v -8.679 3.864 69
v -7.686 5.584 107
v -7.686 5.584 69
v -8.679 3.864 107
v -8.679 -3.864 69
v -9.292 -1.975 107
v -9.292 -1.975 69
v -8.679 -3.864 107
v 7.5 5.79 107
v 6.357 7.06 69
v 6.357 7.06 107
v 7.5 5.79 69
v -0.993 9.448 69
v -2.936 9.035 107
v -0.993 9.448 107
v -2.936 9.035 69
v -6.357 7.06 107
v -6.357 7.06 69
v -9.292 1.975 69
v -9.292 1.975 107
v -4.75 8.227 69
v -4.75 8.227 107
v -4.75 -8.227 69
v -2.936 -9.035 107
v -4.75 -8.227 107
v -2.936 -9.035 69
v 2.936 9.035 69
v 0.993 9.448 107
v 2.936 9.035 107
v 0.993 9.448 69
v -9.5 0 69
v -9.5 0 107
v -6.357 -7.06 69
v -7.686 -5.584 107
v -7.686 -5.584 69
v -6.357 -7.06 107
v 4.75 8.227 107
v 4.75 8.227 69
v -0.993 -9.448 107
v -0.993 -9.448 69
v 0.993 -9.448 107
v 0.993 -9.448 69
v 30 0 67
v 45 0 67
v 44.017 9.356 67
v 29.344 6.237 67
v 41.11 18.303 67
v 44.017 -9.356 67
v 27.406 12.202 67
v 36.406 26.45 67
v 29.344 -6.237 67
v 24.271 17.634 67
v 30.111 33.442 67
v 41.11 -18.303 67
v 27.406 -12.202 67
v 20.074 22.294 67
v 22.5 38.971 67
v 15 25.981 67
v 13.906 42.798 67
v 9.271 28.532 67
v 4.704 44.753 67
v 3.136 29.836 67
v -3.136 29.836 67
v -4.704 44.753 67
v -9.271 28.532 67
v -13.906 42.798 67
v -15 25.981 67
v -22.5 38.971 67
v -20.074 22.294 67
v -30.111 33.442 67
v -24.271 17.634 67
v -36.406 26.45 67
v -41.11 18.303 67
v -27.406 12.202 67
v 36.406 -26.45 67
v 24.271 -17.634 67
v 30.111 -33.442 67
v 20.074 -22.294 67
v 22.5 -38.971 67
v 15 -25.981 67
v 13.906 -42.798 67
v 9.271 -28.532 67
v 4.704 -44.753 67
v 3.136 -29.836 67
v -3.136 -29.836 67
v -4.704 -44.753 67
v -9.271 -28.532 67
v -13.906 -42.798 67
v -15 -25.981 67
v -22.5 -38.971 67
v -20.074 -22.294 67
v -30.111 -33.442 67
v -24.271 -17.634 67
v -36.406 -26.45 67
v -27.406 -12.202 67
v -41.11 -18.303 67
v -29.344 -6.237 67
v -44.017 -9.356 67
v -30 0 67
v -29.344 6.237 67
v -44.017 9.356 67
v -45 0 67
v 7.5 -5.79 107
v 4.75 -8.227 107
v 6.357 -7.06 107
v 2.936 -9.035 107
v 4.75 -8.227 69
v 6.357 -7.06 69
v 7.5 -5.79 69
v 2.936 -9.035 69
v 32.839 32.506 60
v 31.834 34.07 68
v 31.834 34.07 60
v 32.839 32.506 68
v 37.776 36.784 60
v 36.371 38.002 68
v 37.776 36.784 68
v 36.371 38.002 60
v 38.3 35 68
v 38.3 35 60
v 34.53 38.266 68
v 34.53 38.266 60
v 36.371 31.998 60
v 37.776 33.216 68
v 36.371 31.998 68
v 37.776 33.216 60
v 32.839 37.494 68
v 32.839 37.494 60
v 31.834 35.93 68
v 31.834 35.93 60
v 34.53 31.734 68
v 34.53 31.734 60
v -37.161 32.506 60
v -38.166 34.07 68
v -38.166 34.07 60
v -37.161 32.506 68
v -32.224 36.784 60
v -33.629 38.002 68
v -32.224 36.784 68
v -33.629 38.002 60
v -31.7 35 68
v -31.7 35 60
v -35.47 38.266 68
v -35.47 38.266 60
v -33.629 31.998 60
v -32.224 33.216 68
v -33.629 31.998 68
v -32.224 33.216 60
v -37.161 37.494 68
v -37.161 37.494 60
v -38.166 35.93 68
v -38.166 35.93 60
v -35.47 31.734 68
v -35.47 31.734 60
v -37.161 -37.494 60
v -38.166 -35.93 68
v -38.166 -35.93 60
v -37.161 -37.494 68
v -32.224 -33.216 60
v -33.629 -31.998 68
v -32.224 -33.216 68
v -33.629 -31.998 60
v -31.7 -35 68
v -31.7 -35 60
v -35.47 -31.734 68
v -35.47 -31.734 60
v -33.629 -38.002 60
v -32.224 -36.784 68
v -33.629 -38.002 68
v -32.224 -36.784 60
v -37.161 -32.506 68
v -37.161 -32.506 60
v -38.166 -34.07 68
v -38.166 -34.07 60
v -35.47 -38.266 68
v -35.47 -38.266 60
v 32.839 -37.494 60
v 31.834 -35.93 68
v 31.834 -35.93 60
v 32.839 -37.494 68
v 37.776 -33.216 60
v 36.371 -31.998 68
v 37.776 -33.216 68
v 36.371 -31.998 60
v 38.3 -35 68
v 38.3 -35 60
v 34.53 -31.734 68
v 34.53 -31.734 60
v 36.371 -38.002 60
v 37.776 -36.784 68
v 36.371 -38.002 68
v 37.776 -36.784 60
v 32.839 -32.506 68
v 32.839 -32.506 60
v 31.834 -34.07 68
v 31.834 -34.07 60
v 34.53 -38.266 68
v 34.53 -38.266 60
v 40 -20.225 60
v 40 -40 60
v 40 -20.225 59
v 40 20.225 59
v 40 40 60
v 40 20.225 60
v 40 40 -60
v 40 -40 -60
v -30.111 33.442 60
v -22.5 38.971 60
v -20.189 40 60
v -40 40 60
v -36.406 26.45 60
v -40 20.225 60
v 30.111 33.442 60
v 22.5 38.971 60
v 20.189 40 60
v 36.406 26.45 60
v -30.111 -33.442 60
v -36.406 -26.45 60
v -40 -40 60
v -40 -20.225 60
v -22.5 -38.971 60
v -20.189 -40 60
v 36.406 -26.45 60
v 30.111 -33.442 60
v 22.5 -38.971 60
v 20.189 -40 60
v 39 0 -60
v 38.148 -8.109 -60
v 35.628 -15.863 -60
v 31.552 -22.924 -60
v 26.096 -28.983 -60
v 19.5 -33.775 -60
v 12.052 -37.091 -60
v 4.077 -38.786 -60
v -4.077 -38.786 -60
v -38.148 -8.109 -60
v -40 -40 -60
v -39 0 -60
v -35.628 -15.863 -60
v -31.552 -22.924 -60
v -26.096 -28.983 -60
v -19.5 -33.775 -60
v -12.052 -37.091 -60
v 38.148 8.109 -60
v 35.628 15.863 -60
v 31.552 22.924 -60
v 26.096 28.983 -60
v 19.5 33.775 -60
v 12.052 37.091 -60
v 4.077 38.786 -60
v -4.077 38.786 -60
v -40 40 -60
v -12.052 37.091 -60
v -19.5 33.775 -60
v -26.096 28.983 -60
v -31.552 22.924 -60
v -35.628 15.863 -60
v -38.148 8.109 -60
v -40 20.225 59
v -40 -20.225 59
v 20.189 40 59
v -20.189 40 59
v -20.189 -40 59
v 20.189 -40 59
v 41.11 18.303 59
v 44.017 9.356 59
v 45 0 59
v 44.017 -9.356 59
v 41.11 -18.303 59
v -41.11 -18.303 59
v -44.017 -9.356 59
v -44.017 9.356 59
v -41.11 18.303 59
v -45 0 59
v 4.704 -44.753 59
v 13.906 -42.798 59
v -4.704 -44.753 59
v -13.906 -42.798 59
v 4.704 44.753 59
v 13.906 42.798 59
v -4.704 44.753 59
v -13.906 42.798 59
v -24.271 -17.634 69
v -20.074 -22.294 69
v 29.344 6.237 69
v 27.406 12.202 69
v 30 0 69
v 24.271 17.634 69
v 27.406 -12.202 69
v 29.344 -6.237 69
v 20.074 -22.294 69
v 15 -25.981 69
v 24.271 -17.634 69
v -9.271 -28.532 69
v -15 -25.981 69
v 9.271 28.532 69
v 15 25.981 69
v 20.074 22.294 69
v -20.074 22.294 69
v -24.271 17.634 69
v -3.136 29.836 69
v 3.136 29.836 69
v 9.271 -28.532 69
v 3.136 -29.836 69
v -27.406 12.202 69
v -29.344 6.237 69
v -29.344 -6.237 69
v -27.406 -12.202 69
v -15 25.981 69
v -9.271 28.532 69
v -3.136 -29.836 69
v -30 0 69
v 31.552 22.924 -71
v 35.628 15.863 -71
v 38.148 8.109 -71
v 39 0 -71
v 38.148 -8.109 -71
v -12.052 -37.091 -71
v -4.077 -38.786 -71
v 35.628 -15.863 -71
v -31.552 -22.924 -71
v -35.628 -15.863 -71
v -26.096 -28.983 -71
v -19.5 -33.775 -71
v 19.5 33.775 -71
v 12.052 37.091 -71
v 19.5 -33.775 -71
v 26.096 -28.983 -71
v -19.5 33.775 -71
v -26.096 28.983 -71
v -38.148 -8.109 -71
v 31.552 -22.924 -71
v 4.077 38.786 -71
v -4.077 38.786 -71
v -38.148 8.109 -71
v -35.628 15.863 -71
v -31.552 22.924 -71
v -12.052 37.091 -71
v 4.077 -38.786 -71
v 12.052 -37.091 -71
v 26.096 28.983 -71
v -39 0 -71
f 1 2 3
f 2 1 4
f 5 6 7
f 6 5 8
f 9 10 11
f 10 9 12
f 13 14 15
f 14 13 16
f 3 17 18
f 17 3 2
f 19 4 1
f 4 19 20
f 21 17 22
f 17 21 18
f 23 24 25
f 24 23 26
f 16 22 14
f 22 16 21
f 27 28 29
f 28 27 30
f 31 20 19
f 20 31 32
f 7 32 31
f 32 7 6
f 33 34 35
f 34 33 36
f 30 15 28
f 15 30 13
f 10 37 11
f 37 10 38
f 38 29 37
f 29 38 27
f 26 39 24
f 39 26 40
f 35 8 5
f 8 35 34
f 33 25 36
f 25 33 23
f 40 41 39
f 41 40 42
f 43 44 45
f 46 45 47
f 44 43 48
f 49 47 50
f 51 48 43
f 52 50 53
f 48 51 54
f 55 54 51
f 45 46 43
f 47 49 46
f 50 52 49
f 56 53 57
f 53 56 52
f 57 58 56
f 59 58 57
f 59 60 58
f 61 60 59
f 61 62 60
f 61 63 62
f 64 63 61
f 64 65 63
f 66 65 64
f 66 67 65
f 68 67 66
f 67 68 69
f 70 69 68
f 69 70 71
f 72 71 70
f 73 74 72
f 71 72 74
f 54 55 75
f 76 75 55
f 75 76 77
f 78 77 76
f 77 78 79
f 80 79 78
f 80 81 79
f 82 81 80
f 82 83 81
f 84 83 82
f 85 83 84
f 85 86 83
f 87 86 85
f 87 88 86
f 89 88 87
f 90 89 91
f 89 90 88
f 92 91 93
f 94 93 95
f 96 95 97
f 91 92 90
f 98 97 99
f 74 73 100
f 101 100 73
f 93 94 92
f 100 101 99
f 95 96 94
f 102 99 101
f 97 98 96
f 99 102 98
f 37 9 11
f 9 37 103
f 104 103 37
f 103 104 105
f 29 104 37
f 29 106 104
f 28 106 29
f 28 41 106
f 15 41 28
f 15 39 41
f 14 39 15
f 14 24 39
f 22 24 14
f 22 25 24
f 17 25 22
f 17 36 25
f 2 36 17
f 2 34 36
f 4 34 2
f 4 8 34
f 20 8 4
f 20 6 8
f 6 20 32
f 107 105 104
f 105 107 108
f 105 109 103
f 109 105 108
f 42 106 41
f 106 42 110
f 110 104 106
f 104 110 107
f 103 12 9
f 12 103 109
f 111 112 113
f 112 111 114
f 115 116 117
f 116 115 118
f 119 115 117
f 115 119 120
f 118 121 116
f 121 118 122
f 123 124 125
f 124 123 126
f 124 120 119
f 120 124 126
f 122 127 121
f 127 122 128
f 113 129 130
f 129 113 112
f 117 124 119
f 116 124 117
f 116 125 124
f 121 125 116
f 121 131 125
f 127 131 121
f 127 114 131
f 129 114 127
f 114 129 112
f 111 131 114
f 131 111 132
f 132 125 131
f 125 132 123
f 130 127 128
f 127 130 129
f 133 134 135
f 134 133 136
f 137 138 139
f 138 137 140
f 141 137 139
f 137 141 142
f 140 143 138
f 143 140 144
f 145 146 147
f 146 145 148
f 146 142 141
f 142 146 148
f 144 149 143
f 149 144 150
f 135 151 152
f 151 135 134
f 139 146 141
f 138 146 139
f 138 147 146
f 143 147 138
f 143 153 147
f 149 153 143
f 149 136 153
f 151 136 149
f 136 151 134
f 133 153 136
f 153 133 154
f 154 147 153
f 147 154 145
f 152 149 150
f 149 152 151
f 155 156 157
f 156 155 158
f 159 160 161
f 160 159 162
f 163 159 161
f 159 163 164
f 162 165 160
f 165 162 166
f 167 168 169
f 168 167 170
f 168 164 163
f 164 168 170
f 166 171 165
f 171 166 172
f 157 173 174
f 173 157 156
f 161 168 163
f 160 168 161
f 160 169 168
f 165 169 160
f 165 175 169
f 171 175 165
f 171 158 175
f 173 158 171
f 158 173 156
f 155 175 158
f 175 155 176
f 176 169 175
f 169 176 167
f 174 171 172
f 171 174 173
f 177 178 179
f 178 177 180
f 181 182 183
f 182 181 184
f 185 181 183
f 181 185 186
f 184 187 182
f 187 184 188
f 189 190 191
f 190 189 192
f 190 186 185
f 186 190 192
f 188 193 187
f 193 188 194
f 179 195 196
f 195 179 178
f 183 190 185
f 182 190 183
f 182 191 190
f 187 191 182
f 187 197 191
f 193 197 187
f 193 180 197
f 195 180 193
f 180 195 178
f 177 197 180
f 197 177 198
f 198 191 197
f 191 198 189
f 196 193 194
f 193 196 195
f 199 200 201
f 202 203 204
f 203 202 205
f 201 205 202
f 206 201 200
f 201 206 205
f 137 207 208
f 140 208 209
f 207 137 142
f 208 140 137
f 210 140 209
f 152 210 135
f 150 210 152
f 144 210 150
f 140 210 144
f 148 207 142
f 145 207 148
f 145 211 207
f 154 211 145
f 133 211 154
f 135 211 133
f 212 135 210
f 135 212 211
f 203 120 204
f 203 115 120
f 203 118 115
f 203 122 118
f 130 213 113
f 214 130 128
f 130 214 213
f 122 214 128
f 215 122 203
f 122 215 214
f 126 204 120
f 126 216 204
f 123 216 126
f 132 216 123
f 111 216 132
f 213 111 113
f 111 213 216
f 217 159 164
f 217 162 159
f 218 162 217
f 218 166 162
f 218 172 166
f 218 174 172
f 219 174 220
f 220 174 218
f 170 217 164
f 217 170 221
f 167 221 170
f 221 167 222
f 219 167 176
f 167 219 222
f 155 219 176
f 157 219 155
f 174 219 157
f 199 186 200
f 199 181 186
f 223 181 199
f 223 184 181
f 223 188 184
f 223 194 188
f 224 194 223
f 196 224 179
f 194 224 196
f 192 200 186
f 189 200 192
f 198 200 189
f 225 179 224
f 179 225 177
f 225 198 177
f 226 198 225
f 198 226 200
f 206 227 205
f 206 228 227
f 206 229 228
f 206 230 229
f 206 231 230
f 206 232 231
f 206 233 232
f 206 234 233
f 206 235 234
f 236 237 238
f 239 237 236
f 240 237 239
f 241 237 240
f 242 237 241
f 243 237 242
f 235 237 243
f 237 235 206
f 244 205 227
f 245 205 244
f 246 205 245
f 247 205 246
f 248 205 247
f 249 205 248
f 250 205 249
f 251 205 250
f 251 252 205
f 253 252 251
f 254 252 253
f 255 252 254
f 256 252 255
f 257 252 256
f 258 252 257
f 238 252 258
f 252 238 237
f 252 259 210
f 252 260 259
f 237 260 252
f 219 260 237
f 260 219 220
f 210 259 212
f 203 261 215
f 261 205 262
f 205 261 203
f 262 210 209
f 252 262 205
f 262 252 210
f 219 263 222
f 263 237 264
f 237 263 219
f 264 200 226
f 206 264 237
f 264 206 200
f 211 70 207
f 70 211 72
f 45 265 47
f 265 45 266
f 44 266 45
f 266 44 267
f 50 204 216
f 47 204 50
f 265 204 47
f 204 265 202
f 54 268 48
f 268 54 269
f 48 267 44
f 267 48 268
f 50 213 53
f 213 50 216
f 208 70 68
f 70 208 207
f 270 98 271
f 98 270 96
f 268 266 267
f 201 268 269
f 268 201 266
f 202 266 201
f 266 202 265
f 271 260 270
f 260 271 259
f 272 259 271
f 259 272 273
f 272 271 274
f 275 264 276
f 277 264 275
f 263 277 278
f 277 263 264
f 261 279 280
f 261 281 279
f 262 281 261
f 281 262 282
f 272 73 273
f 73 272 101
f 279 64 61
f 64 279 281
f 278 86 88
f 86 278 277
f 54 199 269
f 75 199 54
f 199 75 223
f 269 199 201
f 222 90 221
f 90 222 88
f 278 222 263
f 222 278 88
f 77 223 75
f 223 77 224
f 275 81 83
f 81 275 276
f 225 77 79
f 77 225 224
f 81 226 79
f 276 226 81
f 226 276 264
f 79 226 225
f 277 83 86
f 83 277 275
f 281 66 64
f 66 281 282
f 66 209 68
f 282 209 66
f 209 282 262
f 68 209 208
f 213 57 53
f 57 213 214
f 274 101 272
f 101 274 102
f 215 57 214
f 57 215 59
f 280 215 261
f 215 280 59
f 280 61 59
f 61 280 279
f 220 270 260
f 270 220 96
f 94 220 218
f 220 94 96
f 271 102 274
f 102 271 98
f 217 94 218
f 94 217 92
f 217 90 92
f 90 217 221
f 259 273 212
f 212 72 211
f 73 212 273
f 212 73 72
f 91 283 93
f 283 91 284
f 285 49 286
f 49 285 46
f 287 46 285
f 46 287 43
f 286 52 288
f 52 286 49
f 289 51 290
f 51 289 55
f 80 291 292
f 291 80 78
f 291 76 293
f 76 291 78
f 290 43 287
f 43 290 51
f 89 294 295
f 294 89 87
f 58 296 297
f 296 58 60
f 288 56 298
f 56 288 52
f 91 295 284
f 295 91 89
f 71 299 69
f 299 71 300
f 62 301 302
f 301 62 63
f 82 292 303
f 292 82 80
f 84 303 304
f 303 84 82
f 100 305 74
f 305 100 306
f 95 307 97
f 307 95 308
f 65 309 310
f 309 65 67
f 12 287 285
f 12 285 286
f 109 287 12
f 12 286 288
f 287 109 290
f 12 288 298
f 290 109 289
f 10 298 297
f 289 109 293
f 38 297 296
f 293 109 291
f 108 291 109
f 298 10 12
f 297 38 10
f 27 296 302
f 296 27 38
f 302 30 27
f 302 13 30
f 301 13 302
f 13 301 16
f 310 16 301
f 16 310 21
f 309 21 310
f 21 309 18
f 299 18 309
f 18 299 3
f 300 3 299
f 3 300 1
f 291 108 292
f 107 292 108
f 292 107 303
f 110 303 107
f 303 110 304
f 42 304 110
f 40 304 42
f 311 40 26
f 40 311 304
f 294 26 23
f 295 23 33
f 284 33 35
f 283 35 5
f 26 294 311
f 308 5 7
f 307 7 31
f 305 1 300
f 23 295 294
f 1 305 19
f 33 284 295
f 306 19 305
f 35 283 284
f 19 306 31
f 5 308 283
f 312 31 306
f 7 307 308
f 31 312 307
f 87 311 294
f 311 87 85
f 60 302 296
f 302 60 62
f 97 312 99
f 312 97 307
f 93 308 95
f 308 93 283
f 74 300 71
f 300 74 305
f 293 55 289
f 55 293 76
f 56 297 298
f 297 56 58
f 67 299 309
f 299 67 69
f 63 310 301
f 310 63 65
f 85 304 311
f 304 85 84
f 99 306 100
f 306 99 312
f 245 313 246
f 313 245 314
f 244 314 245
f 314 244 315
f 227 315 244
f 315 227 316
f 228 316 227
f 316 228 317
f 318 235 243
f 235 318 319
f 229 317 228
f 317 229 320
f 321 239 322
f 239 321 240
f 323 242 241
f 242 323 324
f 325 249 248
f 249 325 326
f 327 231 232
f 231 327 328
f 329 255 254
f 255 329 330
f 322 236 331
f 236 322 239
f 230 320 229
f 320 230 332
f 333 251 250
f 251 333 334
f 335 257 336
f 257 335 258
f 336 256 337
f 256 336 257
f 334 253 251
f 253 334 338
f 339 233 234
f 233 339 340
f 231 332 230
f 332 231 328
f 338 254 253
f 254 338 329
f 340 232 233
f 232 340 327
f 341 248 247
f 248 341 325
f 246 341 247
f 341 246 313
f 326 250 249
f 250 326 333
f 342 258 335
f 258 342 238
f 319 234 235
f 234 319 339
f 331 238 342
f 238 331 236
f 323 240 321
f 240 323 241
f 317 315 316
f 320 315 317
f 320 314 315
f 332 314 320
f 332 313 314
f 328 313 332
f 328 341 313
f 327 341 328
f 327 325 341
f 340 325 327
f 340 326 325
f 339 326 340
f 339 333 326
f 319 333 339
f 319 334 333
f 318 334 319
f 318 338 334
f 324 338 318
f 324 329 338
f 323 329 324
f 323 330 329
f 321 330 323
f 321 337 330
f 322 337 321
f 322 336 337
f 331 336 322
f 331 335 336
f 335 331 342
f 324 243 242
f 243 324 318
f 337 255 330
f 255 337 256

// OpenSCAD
// Parameters
body_width = 80; //[40:160:1]
body_height = 80; //[40:160:1]
body_length = 120; //[60:240:1]
flange_diameter_or_width = 90; //[45:180:1]
faceplate_thickness = 8; //[4:16:1]
pilot_diameter = 60; //[30:120:1]
pilot_length = 2; //[1:8:1]
mount_hole_diameter = 6.6; //[3:13:0.1]
mount_hole_pitch_x = 70; //[35:140:1]
mount_hole_pitch_y = 70; //[35:140:1]
shaft_diameter = 19; //[8:38:0.5]
shaft_length = 40; //[15:80:1]
shaft_key_width = 6; //[2:12:0.5]
shaft_key_depth = 2; //[1:6:0.5]
rear_cap_diameter = 78; //[39:156:1]
rear_cap_length = 12; //[6:30:1]
connector_boss_width = 30; //[15:60:1]
connector_boss_height = 20; //[10:40:1]
connector_boss_length = 18; //[8:40:1]
overlap = 1; //[0.5:2:0.1]

// Servo Motor - complete geometry
module servo_motor() {
  color([0.15, 0.2, 0.35]) {
    // Body
    translate([0, 0, 0])
      cube([body_width, body_height, body_length], center=true);

    // Front faceplate flange
    translate([0, 0, body_length/2 + faceplate_thickness/2 - overlap])
      cylinder(r=flange_diameter_or_width/2, h=faceplate_thickness, center=true);

    // Front pilot
    translate([0, 0, body_length/2 + faceplate_thickness - overlap + pilot_length/2])
      cylinder(r=pilot_diameter/2, h=pilot_length, center=true);

    // Output shaft
    difference() {
      translate([0, 0, body_length/2 + faceplate_thickness - overlap + shaft_length/2])
        cylinder(r=shaft_diameter/2, h=shaft_length, center=true);
      translate([shaft_diameter/2 - shaft_key_depth + shaft_key_width/2, 0, body_length/2 + faceplate_thickness - overlap + shaft_length/2])
        cube([shaft_key_width, shaft_diameter, shaft_length + 2*overlap], center=true);
    }

    // Rear cap or connector boss
    translate([0, 0, -body_length/2 - rear_cap_length/2 + overlap])
      cylinder(r=rear_cap_diameter/2, h=rear_cap_length, center=true);

    // Cable exit or connector interface
    translate([0, 0, -body_length/2 - rear_cap_length + overlap + connector_boss_length/2])
      cube([connector_boss_width, connector_boss_height, connector_boss_length], center=true);

    // Mounting holes
    color("White") {
      translate([mount_hole_pitch_x/2, mount_hole_pitch_y/2, body_length/2 + faceplate_thickness/2 - overlap])
        cylinder(r=mount_hole_diameter/2, h=faceplate_thickness + 2*overlap, center=true);
      translate([-mount_hole_pitch_x/2, mount_hole_pitch_y/2, body_length/2 + faceplate_thickness/2 - overlap])
        cylinder(r=mount_hole_diameter/2, h=faceplate_thickness + 2*overlap, center=true);
      translate([-mount_hole_pitch_x/2, -mount_hole_pitch_y/2, body_length/2 + faceplate_thickness/2 - overlap])
        cylinder(r=mount_hole_diameter/2, h=faceplate_thickness + 2*overlap, center=true);
      translate([mount_hole_pitch_x/2, -mount_hole_pitch_y/2, body_length/2 + faceplate_thickness/2 - overlap])
        cylinder(r=mount_hole_diameter/2, h=faceplate_thickness + 2*overlap, center=true);
    }
  }
}

// Assembly
module assembly() {
  servo_motor();
}

assembly();
